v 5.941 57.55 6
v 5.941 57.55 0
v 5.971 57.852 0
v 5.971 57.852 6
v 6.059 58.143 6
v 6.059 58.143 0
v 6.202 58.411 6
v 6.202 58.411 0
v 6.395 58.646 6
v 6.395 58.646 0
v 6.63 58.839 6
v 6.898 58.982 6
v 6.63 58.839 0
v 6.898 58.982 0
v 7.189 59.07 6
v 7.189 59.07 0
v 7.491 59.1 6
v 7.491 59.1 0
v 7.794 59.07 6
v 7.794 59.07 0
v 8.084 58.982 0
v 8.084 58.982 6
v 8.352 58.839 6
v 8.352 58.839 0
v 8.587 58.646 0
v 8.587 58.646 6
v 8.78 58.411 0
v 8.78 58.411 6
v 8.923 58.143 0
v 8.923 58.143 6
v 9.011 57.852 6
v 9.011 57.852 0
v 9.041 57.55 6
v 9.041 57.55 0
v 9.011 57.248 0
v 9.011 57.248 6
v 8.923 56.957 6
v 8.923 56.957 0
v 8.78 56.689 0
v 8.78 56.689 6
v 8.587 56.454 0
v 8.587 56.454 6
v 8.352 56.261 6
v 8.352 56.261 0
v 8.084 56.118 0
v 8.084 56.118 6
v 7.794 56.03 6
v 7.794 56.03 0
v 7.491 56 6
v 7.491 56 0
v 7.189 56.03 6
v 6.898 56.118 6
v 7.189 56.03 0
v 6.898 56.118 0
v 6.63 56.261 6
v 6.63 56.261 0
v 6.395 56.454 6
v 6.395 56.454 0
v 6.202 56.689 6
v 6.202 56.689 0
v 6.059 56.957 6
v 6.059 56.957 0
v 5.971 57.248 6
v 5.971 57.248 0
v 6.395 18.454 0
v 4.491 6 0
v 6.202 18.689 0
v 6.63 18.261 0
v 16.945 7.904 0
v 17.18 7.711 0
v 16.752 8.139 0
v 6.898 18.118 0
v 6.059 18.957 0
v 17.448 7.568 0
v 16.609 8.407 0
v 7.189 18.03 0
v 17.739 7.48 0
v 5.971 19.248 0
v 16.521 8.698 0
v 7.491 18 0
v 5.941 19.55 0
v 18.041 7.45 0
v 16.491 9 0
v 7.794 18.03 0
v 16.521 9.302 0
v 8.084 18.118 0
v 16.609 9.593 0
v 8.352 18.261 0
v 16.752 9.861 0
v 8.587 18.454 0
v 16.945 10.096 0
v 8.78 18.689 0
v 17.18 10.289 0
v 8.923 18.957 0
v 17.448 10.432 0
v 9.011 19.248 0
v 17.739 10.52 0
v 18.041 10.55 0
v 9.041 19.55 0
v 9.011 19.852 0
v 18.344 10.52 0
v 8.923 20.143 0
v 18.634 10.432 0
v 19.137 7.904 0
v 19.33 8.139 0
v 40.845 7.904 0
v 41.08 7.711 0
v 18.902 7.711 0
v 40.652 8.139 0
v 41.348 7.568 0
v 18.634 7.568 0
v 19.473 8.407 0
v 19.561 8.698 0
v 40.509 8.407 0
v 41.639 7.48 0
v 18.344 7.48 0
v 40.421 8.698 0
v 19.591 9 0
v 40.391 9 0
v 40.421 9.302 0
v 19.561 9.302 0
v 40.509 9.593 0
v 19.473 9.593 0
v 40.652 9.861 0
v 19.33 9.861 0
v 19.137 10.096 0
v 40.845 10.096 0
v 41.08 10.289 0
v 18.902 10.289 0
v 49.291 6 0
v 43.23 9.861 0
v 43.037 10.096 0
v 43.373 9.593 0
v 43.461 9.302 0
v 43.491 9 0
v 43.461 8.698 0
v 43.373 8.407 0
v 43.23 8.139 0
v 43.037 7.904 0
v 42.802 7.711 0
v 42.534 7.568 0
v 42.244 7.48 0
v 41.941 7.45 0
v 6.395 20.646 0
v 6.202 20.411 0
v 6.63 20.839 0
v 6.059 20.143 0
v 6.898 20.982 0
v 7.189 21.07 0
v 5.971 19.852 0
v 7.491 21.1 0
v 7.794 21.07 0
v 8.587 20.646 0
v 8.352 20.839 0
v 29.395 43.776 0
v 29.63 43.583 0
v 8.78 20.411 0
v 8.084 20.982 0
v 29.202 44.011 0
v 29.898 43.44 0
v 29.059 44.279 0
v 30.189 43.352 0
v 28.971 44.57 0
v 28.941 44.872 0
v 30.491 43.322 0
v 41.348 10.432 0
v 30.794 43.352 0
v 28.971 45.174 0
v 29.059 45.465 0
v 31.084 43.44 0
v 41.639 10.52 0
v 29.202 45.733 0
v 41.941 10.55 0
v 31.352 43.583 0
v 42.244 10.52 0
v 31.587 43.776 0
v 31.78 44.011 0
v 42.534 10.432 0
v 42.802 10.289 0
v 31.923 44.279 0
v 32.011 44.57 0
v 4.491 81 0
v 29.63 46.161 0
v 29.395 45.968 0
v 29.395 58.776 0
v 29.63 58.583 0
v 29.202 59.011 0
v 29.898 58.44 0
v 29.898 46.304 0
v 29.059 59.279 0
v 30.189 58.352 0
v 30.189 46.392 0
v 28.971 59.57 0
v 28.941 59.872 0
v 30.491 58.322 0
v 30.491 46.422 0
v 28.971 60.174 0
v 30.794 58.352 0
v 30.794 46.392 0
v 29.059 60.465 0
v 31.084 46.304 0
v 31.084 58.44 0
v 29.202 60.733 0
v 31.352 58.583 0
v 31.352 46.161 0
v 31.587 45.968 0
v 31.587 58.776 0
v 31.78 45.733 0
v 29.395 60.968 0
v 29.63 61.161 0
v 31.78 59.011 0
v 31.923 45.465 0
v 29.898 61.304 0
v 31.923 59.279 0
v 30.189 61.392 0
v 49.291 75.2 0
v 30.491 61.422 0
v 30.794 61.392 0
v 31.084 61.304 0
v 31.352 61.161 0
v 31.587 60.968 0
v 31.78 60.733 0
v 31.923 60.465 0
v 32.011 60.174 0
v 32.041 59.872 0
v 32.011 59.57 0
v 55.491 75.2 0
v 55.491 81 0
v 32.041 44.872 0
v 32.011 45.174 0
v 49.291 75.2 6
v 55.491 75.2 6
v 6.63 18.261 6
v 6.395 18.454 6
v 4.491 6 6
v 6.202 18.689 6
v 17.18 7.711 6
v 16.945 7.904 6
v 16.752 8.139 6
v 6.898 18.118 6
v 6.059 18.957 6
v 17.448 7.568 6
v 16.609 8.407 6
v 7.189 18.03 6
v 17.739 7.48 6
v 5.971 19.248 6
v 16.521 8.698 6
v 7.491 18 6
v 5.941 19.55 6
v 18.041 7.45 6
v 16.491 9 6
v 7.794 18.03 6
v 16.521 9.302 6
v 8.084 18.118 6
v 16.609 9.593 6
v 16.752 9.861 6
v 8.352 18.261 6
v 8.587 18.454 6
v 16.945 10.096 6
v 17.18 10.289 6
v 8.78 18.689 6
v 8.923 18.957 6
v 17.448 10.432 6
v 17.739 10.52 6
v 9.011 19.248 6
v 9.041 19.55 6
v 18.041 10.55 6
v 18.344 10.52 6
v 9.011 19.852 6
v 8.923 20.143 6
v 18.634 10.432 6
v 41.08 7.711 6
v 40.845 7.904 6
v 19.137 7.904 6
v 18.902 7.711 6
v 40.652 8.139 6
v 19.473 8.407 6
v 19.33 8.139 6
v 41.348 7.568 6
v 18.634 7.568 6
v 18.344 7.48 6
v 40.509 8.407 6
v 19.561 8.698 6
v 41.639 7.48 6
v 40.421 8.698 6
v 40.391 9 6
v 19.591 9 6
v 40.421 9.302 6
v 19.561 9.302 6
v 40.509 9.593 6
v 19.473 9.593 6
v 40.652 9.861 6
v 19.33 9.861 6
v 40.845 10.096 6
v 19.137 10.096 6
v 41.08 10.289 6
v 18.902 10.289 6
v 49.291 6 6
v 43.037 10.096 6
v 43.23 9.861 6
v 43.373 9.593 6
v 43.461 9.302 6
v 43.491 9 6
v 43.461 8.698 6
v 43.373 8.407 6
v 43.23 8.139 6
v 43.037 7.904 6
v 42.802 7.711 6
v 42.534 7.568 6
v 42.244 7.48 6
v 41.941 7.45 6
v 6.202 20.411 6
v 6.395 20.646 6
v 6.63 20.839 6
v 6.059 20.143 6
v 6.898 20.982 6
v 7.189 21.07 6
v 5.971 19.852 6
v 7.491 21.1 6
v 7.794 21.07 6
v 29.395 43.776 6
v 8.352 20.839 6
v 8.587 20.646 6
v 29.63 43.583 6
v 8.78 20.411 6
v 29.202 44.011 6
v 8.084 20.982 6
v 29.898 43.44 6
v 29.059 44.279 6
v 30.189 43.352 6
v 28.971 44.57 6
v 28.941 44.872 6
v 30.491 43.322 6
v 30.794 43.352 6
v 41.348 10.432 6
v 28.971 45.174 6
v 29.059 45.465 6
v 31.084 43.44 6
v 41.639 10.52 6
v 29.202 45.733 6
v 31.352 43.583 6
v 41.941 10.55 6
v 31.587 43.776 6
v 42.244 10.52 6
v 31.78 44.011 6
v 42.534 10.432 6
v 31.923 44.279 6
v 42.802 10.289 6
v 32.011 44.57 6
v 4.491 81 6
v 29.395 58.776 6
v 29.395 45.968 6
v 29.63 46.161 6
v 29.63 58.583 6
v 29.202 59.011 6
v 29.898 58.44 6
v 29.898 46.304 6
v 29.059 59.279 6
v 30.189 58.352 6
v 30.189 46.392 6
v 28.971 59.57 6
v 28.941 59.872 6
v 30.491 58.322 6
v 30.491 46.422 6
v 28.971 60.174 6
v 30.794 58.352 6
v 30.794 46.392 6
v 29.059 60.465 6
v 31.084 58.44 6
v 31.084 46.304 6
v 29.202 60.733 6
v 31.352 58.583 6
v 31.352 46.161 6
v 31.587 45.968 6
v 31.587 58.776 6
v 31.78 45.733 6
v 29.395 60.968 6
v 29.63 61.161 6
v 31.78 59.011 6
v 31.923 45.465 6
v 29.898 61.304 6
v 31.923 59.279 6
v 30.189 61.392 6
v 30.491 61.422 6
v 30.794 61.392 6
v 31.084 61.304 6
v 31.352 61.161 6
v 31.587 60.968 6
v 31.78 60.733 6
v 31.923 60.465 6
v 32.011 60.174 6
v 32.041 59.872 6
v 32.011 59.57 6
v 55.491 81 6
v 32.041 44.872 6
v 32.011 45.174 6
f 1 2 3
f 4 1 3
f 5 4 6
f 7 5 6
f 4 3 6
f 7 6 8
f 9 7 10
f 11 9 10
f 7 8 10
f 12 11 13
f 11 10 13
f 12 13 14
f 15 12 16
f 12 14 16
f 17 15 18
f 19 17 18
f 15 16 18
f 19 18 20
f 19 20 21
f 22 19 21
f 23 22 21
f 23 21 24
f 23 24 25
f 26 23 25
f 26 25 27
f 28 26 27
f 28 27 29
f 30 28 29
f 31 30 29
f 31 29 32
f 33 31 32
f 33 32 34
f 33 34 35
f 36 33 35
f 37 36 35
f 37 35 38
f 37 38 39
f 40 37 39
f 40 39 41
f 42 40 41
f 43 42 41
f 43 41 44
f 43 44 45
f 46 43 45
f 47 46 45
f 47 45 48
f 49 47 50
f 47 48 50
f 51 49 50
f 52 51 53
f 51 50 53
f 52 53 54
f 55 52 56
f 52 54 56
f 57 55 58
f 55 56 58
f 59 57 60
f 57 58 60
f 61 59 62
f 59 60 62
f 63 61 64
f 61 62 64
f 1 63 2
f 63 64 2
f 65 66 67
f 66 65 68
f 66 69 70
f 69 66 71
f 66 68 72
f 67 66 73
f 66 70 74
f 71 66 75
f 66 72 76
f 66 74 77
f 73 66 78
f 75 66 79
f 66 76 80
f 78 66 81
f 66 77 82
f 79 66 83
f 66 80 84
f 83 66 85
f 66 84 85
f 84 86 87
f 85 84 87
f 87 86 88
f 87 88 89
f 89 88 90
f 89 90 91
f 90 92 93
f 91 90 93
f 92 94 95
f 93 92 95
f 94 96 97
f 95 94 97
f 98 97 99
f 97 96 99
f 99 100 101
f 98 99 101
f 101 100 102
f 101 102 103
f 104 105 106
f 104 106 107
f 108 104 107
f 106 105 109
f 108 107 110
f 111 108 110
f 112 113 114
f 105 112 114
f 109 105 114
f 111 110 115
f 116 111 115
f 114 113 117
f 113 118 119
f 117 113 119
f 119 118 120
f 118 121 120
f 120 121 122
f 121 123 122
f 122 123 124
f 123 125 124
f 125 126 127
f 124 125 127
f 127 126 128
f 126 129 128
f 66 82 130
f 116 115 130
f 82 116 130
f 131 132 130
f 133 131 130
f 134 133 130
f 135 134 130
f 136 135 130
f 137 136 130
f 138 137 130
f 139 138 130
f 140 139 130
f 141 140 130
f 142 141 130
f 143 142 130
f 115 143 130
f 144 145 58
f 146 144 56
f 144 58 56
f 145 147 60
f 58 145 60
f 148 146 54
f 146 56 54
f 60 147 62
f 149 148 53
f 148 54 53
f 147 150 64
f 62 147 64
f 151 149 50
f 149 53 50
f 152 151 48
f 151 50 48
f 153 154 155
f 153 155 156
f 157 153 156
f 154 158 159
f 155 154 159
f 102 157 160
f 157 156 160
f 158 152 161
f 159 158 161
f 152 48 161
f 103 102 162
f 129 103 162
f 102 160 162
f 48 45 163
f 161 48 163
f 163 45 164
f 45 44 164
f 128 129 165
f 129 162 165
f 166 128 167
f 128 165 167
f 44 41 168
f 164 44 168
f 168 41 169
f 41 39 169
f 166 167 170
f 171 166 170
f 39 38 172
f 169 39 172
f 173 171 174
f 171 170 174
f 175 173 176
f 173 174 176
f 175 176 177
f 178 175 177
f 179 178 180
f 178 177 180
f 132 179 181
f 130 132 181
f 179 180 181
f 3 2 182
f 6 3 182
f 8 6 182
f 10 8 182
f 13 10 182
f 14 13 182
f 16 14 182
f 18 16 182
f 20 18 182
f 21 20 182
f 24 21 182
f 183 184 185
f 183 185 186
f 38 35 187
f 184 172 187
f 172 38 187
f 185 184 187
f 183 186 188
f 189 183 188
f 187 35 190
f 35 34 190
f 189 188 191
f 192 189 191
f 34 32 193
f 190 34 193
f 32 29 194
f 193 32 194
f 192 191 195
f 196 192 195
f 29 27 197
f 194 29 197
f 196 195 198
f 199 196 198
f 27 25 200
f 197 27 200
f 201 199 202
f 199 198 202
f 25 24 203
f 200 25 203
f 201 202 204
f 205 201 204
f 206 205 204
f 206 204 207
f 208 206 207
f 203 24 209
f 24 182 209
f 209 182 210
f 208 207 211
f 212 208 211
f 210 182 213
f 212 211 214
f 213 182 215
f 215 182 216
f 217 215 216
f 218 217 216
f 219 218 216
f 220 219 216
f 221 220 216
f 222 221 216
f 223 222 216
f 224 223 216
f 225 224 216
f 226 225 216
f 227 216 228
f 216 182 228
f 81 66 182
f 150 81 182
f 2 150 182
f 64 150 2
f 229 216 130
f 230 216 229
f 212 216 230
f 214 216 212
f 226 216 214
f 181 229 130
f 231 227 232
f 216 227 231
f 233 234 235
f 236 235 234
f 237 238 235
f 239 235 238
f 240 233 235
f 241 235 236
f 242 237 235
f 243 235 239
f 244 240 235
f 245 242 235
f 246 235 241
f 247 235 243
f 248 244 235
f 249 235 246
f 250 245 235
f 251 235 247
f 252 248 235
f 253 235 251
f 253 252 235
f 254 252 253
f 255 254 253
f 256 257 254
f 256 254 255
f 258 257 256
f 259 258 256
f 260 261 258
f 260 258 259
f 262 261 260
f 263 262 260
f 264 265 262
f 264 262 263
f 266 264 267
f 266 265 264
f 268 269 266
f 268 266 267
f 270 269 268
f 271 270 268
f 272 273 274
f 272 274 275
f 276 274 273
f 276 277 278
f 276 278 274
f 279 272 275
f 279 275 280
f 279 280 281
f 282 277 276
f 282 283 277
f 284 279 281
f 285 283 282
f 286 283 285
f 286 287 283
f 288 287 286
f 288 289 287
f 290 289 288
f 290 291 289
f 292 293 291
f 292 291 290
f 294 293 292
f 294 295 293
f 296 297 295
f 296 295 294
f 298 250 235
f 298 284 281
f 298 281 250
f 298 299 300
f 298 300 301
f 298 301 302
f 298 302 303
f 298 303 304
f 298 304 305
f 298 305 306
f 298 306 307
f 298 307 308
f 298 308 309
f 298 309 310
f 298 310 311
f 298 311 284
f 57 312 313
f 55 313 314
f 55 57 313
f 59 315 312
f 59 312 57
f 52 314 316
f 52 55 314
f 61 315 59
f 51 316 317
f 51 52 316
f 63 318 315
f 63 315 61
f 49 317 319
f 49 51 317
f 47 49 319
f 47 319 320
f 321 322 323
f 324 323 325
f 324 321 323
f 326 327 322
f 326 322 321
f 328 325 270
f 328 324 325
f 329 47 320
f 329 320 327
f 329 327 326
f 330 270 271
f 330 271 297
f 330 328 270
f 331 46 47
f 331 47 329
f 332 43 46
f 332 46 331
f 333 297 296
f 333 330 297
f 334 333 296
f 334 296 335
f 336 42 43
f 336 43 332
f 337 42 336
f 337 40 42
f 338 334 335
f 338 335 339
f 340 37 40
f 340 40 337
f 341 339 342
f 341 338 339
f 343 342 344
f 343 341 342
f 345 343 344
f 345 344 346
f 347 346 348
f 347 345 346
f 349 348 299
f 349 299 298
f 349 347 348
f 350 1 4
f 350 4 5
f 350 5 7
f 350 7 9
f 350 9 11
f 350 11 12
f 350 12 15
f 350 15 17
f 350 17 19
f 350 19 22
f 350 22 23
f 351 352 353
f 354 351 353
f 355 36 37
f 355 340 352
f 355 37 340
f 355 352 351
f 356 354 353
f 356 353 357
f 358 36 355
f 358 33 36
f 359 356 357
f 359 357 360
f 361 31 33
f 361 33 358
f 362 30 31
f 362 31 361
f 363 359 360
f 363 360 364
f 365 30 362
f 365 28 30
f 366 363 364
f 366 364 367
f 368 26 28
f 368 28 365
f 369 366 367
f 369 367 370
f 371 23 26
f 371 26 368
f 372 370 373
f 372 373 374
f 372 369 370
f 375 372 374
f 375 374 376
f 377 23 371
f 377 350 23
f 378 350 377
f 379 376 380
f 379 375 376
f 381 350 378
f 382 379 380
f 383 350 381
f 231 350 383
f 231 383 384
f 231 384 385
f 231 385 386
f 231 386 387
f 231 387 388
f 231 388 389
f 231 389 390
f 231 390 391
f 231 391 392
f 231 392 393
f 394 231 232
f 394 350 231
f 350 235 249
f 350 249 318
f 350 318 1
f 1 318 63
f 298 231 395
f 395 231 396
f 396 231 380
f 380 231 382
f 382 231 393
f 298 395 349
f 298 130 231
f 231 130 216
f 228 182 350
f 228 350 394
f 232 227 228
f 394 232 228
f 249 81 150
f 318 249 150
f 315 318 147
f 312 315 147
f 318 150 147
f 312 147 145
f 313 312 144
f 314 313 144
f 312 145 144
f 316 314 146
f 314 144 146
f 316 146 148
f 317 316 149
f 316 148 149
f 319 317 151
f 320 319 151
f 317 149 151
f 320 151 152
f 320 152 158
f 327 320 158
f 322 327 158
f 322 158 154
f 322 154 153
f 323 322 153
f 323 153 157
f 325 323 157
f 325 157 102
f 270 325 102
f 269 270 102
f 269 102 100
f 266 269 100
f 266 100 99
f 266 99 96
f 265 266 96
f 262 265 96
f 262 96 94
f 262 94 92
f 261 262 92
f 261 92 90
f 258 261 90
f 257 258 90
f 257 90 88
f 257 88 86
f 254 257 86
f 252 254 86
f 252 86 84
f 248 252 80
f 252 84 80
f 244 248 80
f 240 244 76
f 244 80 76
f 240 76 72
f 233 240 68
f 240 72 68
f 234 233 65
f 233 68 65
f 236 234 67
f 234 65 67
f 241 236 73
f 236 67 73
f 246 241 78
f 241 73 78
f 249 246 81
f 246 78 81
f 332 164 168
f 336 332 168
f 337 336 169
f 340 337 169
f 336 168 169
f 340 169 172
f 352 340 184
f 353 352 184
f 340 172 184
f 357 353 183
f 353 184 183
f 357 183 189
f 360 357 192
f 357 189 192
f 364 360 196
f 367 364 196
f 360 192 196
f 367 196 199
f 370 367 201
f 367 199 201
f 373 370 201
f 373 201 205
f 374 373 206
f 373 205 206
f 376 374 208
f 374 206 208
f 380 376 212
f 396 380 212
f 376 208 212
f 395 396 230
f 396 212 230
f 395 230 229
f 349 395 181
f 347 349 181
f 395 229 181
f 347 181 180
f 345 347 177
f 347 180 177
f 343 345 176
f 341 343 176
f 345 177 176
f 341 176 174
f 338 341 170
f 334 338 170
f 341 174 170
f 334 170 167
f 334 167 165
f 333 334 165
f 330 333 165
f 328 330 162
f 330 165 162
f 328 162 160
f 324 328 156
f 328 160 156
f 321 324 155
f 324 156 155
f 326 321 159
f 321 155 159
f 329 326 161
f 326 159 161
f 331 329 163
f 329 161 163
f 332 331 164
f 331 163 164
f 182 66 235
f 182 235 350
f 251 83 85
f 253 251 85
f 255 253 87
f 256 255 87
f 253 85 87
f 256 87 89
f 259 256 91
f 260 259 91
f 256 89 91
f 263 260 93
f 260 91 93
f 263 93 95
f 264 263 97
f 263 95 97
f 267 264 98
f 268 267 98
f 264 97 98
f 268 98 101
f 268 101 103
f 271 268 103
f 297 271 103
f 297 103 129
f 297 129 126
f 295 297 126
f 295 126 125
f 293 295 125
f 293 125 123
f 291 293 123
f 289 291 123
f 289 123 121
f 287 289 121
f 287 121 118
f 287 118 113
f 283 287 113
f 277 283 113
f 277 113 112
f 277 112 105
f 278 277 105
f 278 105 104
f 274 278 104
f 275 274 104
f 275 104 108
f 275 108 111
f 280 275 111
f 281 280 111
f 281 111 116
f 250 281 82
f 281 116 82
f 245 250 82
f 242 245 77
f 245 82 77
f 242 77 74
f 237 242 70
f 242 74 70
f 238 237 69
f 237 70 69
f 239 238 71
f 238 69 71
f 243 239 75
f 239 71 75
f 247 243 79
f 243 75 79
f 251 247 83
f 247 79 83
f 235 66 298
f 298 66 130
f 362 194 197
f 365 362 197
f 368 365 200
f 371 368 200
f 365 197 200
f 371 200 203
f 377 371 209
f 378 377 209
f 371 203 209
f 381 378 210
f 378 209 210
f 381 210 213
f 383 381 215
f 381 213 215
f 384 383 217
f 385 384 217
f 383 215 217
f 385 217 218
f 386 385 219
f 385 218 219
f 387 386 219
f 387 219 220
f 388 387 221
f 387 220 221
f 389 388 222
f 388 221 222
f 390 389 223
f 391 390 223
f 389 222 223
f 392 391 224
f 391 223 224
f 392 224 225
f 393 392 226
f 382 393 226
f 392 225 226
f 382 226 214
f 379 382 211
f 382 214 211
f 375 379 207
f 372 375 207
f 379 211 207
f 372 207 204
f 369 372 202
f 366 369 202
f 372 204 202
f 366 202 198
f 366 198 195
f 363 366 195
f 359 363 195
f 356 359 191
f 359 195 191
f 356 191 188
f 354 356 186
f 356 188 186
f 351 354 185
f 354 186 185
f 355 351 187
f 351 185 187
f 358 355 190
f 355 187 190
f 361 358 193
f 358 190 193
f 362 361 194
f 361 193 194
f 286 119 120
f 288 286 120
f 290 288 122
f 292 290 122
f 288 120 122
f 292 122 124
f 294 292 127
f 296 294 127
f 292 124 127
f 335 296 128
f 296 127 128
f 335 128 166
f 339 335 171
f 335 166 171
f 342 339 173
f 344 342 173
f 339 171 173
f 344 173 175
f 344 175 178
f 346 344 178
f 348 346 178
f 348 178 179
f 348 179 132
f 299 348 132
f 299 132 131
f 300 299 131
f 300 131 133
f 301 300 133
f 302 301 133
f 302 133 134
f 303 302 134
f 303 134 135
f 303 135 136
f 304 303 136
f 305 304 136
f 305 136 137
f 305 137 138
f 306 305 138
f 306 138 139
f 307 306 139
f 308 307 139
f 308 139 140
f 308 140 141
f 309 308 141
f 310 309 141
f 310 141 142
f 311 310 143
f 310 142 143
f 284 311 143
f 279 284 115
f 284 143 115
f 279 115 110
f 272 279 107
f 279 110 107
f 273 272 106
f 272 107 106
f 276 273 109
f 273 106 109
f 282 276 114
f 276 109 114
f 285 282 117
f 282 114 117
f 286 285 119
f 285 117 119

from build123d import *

# Parameters (mm, degrees)
SZKIC1_W                    = 51
SZKIC1_H                    = 75
DODANIE_WYCI_GNI_CIE1_DEPTH = 6
SZKIC3_R                    = 1.55
WYTNIJ_WYCI_GNI_CIE1_DEPTH  = 99.368039697
SZKIC5_R                    = 1.55
WYTNIJ_WYCI_GNI_CIE2_DEPTH  = 6
SZKIC6_W                    = 6.4
SZKIC6_H                    = 69.4
WYTNIJ_WYCI_GNI_CIE3_DEPTH  = 10


with BuildPart() as part:
    # Szkic1 → Dodanie-wyciągnięcie1 (new body)
    with BuildSketch(Plane.XY):
        with Locations((29.991181586, 43.5)):
            Rectangle(SZKIC1_W, SZKIC1_H)
    extrude(amount=DODANIE_WYCI_GNI_CIE1_DEPTH)

    # Szkic3 → Wytnij-wyciągnięcie1 (cut, through all)
    with BuildSketch(Plane(origin=(0, 0, 0), x_dir=(-1, 0, 0), z_dir=(0, 0, -1))):
        with Locations((-18.041181586, 9)):
            Circle(SZKIC3_R)
        with Locations((-41.941181586, 9)):
            Circle(SZKIC3_R)
        with Locations((-7.491181586, 19.55)):
            Circle(SZKIC3_R)
        with Locations((-7.491181586, 57.55)):
            Circle(SZKIC3_R)
    extrude(amount=-WYTNIJ_WYCI_GNI_CIE1_DEPTH, mode=Mode.SUBTRACT)

    # Szkic5 → Wytnij-wyciągnięcie2 (cut)
    with BuildSketch(Plane(origin=(0, 0, 0), x_dir=(-1, 0, 0), z_dir=(0, 0, -1))):
        with Locations((-30.491181586, 59.871958533)):
            Circle(SZKIC5_R)
        with Locations((-30.491181586, 44.871958533)):
            Circle(SZKIC5_R)
    extrude(amount=-WYTNIJ_WYCI_GNI_CIE2_DEPTH, mode=Mode.SUBTRACT)

    # Szkic6 → Wytnij-wyciągnięcie3 (cut)
    with BuildSketch(Plane(origin=(0, 0, 0), x_dir=(-1, 0, 0), z_dir=(0, 0, -1))):
        with Locations((-52.491181586, 40.5)):
            Rectangle(SZKIC6_W, SZKIC6_H)
    extrude(amount=-WYTNIJ_WYCI_GNI_CIE3_DEPTH, mode=Mode.SUBTRACT)


solid = part.part
